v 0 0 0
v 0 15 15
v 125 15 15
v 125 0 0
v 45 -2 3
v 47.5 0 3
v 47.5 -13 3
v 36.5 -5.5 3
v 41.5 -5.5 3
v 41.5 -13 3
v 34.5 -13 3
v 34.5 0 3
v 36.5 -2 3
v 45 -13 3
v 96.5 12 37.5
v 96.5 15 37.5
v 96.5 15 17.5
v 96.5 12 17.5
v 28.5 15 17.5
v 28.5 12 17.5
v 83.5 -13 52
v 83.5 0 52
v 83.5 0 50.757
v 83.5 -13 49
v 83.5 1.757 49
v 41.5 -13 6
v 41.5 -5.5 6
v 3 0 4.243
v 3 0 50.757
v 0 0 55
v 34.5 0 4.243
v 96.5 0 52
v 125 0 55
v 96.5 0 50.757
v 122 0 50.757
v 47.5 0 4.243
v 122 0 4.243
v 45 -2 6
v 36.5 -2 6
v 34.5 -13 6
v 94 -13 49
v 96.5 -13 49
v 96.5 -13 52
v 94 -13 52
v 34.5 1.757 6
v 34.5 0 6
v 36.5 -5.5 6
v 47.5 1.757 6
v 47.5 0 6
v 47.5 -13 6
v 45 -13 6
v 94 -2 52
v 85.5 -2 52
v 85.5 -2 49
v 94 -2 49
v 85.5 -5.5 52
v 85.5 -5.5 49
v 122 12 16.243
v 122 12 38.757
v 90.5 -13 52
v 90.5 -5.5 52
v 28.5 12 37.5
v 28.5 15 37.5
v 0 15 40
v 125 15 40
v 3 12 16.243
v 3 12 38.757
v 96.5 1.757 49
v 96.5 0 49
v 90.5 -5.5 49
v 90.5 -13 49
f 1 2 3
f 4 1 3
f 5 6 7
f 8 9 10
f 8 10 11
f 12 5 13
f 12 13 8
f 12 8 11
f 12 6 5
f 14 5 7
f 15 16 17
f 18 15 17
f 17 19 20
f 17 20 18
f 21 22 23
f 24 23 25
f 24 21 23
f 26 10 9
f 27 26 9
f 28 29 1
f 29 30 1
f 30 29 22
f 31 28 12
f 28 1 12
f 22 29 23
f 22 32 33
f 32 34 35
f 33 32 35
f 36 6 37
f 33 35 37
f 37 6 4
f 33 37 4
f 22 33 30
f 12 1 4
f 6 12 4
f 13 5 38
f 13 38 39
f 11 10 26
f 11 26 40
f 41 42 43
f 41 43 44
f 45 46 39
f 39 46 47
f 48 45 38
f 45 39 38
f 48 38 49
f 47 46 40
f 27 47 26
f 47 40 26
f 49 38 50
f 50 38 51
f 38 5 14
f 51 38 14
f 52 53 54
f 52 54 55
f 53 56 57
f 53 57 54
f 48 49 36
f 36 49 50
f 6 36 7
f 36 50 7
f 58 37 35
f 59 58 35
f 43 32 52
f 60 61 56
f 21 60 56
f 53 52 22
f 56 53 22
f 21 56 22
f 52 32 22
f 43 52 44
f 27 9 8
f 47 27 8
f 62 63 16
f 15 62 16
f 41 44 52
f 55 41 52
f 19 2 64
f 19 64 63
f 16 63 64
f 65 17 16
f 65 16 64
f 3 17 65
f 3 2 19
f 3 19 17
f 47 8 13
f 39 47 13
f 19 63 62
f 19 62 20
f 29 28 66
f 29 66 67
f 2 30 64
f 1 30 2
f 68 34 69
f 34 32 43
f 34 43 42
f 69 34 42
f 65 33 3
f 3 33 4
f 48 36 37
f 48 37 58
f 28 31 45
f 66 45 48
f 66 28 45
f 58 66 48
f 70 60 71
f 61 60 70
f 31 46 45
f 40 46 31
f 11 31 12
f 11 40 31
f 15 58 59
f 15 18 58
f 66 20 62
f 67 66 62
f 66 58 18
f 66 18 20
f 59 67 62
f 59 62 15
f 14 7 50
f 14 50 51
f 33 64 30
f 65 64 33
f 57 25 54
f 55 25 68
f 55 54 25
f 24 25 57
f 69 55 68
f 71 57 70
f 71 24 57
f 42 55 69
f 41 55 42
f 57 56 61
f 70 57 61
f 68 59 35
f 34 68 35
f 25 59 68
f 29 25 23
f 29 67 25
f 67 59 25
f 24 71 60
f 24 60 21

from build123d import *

# Parameters (mm, degrees)
SKETCH1_W           = 125
SKETCH1_H           = 55
BOSS_EXTRUDE1_DEPTH = 15
CHAMFER1_SIZE       = 15
SHELL1_START        = 3
SHELL1_DEPTH        = 119
SKETCH2_W           = 13
SKETCH2_H           = 3
BOSS_EXTRUDE3_DEPTH = 13
SKETCH3_W           = 3.5
SKETCH3_H           = 7.5
SKETCH3_W_2         = 8.5
SKETCH3_H_2         = 3.5
CUT_EXTRUDE1_DEPTH  = 13
SKETCH5_W           = 3.5
SKETCH5_H           = 7.5
SKETCH5_W_2         = 8.5
SKETCH5_H_2         = 3.5
CUT_EXTRUDE2_DEPTH  = 13
SKETCH6_W           = 68
SKETCH6_H           = 20
CUT_EXTRUDE3_DEPTH  = 3
SKETCH7_W           = 13
SKETCH7_H           = 1.757359313
BOSS_EXTRUDE4_DEPTH = 4
SKETCH8_W           = 13
SKETCH8_H           = 1.757359313
BOSS_EXTRUDE5_DEPTH = 4


# Read off the part's stored shape, not the designer's step: Shell1
with BuildPart() as part:
    # Sketch1 → Boss-Extrude1 (new body)
    with BuildSketch(Plane(origin=(0, 0, 0), x_dir=(1, 0, 0), z_dir=(0, 1, 0))):
        with Locations((62.5, -27.5)):
            Rectangle(SKETCH1_W, SKETCH1_H)
    extrude(amount=BOSS_EXTRUDE1_DEPTH)

    # Chamfer1
    chamfer1_edges = [part.edges().sort_by_distance(p)[0] for p in [
        (62.5, 15, 55),
        (62.5, 15, 0),
    ]]
    chamfer(chamfer1_edges, length=CHAMFER1_SIZE - 0.0001)  # a hair under: the kernel refuses the full size

    # Shell1 outline → Shell1 (cut)
    with BuildSketch(Plane.YZ.offset(SHELL1_START)):
        Polygon((0, 4.242640687), (12, 16.242640687), (12, 38.757359313), (0, 50.757359313), align=None)
    extrude(amount=SHELL1_DEPTH, mode=Mode.SUBTRACT)

    # Sketch2 → Boss-Extrude3 (add)
    with BuildSketch(Plane(origin=(0, 0, 0), x_dir=(-1, 0, 0), z_dir=(0, -1, 0))):
        with Locations((-41, -4.5)):
            Rectangle(SKETCH2_W, SKETCH2_H)
        with Locations((-90, -50.5)):
            Rectangle(SKETCH2_W, SKETCH2_H)
    extrude(amount=BOSS_EXTRUDE3_DEPTH)

    # Sketch3 → Cut-Extrude1 (cut)
    with BuildSketch(Plane.XY.offset(52)):
        with Locations((92.25, -9.25)):
            Rectangle(SKETCH3_W, SKETCH3_H)
        with Locations((89.75, -3.75)):
            Rectangle(SKETCH3_W_2, SKETCH3_H_2)
    extrude(amount=-CUT_EXTRUDE1_DEPTH, mode=Mode.SUBTRACT)

    # Sketch5 → Cut-Extrude2 (cut)
    with BuildSketch(Plane(origin=(0, 0, 3), x_dir=(-1, 0, 0), z_dir=(0, 0, -1))):
        with Locations((-43.25, -9.25)):
            Rectangle(SKETCH5_W, SKETCH5_H)
        with Locations((-40.75, -3.75)):
            Rectangle(SKETCH5_W_2, SKETCH5_H_2)
    extrude(amount=-CUT_EXTRUDE2_DEPTH, mode=Mode.SUBTRACT)

    # Sketch6 → Cut-Extrude3 (cut)
    with BuildSketch(Plane(origin=(0, 15, 0), x_dir=(1, 0, 0), z_dir=(0, 1, 0))):
        with Locations((62.5, -27.5)):
            Rectangle(SKETCH6_W, SKETCH6_H)
    extrude(amount=-CUT_EXTRUDE3_DEPTH, mode=Mode.SUBTRACT)

    # Sketch7 → Boss-Extrude4 (add)
    with BuildSketch(Plane(origin=(0, 0, 0), x_dir=(1, 0, 0), z_dir=(0, 1, 0))):
        with Locations((41, -5.121320344)):
            Rectangle(SKETCH7_W, SKETCH7_H)
    extrude(amount=BOSS_EXTRUDE4_DEPTH)

    # Sketch8 → Boss-Extrude5 (add)
    with BuildSketch(Plane(origin=(0, 0, 0), x_dir=(1, 0, 0), z_dir=(0, 1, 0))):
        with Locations((90, -49.878679656)):
            Rectangle(SKETCH8_W, SKETCH8_H)
    extrude(amount=BOSS_EXTRUDE5_DEPTH)


solid = part.part
